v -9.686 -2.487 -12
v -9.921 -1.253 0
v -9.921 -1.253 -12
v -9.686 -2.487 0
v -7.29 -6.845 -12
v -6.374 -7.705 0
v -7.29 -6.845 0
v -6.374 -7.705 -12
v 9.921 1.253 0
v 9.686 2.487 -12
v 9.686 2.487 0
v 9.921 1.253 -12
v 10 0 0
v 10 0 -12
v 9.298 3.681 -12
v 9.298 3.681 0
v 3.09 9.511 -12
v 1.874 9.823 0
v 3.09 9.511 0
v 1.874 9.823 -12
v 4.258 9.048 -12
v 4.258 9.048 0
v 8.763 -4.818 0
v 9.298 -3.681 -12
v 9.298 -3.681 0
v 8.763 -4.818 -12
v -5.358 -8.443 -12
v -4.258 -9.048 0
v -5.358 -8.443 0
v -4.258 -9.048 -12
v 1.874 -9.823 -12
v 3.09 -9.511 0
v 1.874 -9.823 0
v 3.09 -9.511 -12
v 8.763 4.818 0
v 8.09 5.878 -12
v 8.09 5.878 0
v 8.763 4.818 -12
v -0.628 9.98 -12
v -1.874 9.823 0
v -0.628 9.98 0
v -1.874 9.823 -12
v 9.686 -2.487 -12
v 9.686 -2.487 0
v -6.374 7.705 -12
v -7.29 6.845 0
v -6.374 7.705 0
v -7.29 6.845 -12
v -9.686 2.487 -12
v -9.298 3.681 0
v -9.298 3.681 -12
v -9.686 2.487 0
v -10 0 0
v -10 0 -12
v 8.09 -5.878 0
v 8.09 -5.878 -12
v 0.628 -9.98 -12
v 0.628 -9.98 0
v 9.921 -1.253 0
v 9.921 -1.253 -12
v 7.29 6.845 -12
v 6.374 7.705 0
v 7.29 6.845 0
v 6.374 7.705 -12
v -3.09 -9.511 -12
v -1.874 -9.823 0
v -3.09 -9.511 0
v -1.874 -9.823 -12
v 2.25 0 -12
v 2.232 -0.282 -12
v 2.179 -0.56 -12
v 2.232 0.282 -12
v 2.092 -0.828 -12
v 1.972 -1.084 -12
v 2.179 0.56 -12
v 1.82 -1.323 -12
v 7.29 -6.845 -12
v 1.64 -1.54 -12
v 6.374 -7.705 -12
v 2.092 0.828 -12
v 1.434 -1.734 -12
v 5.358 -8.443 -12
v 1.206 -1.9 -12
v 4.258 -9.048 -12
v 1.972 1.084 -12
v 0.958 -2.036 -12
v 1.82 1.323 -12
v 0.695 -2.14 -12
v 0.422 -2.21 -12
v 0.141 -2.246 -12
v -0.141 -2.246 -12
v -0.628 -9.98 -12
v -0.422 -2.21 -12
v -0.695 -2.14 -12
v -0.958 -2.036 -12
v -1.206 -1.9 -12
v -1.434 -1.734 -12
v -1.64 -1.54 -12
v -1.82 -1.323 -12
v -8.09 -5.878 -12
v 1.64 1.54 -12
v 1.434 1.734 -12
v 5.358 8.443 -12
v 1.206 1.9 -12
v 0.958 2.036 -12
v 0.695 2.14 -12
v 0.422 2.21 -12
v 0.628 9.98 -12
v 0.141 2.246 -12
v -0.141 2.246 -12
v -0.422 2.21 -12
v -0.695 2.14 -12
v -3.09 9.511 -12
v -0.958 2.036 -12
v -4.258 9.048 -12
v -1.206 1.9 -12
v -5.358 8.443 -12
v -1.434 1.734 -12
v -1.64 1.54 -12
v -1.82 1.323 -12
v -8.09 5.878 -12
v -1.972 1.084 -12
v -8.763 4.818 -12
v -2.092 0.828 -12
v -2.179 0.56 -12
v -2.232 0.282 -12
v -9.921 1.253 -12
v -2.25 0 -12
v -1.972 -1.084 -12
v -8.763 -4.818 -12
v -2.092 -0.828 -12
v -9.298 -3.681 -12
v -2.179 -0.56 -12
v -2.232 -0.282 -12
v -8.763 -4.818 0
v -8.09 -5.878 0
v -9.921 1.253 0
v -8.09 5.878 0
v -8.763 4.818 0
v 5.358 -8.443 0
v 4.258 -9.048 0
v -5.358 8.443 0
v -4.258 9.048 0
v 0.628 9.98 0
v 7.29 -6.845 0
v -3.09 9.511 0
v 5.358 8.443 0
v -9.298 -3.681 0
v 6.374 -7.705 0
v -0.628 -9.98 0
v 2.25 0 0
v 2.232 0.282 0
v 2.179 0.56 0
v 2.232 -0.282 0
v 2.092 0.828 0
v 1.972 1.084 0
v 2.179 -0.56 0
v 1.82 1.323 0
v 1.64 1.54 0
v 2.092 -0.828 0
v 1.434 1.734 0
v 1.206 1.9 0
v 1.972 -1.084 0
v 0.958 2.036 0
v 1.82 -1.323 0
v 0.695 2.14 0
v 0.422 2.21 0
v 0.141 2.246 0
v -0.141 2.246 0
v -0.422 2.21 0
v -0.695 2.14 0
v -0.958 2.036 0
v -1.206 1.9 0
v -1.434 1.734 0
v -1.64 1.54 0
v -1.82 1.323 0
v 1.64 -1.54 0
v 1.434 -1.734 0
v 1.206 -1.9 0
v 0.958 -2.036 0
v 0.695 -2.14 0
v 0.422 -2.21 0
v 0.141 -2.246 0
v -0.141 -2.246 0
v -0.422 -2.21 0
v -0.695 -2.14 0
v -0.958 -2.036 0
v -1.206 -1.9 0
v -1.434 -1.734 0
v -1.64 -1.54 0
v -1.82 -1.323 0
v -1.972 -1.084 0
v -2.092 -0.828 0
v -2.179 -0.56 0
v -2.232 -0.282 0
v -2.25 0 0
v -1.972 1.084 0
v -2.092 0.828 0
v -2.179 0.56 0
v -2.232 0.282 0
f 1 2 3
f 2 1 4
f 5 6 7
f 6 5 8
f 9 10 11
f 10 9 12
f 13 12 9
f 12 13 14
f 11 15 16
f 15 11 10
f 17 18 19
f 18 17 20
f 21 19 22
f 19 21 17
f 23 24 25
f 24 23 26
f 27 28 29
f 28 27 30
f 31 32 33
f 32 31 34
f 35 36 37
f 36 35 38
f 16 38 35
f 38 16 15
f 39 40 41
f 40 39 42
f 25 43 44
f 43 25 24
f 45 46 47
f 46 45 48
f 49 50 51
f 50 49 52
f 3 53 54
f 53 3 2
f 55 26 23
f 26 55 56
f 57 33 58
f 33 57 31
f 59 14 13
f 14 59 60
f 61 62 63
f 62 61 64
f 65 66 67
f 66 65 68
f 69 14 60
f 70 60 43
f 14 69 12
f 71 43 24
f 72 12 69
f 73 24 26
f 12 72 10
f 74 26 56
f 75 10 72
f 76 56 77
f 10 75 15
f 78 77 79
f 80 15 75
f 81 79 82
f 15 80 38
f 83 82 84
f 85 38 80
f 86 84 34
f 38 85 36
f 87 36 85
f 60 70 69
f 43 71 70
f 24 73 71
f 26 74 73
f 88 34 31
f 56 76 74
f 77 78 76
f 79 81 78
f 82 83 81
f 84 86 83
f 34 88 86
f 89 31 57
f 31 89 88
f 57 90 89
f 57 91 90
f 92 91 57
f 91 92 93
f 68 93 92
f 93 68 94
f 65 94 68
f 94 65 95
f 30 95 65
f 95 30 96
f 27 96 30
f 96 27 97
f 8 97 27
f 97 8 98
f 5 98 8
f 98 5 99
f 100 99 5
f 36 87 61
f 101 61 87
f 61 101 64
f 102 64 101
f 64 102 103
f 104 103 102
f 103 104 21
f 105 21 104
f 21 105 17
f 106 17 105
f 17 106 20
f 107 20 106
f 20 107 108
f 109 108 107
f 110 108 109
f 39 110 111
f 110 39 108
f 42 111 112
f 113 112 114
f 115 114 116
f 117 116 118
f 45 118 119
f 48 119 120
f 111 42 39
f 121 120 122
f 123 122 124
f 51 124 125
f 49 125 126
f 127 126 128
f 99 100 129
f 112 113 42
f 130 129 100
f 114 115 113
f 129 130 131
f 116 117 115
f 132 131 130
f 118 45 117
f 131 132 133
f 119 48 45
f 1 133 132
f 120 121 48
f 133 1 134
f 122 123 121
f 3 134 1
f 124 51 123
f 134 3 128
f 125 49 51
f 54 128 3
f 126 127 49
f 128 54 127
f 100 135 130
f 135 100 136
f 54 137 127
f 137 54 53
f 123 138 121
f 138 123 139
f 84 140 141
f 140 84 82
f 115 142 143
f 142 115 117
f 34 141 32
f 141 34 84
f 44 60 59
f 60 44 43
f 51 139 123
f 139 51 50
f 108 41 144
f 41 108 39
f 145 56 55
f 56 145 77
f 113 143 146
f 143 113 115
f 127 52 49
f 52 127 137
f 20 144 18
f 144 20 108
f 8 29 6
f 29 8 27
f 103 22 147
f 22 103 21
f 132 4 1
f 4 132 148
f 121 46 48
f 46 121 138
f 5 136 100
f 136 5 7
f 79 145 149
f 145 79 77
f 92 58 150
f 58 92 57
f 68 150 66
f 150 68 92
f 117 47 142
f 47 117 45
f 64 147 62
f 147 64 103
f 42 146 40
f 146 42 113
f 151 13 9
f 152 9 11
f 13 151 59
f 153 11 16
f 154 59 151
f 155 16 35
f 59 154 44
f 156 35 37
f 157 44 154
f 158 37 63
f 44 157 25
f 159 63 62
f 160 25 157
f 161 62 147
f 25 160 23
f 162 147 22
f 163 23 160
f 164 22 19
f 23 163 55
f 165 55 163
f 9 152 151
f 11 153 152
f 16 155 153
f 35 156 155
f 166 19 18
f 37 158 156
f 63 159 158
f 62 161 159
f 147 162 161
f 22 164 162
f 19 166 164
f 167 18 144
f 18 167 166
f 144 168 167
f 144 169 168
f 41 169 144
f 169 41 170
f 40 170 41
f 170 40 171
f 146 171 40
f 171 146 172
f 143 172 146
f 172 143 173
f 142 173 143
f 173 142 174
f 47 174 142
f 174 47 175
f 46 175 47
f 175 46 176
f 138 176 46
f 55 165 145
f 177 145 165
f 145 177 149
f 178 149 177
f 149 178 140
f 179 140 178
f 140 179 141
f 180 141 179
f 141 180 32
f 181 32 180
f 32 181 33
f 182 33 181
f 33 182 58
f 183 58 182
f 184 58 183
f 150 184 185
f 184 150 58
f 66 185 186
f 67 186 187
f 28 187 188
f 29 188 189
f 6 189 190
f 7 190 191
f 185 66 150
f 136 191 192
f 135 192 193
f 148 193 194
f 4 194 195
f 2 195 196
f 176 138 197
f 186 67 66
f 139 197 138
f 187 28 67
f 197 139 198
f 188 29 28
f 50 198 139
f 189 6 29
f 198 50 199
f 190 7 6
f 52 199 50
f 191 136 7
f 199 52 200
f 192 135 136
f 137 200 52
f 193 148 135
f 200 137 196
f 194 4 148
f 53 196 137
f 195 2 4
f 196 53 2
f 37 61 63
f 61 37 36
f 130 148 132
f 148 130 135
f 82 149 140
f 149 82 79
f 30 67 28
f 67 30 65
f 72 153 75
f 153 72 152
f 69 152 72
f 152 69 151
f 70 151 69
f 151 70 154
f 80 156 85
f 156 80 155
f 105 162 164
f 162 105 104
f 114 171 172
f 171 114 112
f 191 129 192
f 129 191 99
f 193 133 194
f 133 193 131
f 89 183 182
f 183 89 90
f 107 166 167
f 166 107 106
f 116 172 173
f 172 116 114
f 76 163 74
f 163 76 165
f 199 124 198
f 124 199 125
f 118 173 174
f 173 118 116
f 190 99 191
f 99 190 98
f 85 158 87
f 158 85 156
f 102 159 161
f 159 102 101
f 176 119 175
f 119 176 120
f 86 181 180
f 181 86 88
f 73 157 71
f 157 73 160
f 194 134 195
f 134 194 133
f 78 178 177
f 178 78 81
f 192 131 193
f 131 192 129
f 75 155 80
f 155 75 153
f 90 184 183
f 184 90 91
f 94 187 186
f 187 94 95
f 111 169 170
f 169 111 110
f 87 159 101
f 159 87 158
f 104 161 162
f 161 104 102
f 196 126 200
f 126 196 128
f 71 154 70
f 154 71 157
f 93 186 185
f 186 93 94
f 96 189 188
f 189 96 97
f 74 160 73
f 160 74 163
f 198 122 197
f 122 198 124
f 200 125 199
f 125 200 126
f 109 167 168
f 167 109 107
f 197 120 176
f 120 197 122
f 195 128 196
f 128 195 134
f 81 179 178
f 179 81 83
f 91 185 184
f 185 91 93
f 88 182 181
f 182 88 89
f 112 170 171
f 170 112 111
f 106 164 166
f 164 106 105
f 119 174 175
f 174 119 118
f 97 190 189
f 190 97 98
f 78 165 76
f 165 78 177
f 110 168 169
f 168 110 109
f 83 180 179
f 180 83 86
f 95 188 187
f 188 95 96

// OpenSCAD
$fn = 50;


difference() {
	union() {
		translate(v = [0, 0, -12.0000000000]) {
			cylinder(h = 12, r = 10.0000000000);
		}
	}
	union() {
		#translate(v = [0, 0, -12]) {
			cylinder(h = 12, r = 2.2500000000);
		}
	}
}
